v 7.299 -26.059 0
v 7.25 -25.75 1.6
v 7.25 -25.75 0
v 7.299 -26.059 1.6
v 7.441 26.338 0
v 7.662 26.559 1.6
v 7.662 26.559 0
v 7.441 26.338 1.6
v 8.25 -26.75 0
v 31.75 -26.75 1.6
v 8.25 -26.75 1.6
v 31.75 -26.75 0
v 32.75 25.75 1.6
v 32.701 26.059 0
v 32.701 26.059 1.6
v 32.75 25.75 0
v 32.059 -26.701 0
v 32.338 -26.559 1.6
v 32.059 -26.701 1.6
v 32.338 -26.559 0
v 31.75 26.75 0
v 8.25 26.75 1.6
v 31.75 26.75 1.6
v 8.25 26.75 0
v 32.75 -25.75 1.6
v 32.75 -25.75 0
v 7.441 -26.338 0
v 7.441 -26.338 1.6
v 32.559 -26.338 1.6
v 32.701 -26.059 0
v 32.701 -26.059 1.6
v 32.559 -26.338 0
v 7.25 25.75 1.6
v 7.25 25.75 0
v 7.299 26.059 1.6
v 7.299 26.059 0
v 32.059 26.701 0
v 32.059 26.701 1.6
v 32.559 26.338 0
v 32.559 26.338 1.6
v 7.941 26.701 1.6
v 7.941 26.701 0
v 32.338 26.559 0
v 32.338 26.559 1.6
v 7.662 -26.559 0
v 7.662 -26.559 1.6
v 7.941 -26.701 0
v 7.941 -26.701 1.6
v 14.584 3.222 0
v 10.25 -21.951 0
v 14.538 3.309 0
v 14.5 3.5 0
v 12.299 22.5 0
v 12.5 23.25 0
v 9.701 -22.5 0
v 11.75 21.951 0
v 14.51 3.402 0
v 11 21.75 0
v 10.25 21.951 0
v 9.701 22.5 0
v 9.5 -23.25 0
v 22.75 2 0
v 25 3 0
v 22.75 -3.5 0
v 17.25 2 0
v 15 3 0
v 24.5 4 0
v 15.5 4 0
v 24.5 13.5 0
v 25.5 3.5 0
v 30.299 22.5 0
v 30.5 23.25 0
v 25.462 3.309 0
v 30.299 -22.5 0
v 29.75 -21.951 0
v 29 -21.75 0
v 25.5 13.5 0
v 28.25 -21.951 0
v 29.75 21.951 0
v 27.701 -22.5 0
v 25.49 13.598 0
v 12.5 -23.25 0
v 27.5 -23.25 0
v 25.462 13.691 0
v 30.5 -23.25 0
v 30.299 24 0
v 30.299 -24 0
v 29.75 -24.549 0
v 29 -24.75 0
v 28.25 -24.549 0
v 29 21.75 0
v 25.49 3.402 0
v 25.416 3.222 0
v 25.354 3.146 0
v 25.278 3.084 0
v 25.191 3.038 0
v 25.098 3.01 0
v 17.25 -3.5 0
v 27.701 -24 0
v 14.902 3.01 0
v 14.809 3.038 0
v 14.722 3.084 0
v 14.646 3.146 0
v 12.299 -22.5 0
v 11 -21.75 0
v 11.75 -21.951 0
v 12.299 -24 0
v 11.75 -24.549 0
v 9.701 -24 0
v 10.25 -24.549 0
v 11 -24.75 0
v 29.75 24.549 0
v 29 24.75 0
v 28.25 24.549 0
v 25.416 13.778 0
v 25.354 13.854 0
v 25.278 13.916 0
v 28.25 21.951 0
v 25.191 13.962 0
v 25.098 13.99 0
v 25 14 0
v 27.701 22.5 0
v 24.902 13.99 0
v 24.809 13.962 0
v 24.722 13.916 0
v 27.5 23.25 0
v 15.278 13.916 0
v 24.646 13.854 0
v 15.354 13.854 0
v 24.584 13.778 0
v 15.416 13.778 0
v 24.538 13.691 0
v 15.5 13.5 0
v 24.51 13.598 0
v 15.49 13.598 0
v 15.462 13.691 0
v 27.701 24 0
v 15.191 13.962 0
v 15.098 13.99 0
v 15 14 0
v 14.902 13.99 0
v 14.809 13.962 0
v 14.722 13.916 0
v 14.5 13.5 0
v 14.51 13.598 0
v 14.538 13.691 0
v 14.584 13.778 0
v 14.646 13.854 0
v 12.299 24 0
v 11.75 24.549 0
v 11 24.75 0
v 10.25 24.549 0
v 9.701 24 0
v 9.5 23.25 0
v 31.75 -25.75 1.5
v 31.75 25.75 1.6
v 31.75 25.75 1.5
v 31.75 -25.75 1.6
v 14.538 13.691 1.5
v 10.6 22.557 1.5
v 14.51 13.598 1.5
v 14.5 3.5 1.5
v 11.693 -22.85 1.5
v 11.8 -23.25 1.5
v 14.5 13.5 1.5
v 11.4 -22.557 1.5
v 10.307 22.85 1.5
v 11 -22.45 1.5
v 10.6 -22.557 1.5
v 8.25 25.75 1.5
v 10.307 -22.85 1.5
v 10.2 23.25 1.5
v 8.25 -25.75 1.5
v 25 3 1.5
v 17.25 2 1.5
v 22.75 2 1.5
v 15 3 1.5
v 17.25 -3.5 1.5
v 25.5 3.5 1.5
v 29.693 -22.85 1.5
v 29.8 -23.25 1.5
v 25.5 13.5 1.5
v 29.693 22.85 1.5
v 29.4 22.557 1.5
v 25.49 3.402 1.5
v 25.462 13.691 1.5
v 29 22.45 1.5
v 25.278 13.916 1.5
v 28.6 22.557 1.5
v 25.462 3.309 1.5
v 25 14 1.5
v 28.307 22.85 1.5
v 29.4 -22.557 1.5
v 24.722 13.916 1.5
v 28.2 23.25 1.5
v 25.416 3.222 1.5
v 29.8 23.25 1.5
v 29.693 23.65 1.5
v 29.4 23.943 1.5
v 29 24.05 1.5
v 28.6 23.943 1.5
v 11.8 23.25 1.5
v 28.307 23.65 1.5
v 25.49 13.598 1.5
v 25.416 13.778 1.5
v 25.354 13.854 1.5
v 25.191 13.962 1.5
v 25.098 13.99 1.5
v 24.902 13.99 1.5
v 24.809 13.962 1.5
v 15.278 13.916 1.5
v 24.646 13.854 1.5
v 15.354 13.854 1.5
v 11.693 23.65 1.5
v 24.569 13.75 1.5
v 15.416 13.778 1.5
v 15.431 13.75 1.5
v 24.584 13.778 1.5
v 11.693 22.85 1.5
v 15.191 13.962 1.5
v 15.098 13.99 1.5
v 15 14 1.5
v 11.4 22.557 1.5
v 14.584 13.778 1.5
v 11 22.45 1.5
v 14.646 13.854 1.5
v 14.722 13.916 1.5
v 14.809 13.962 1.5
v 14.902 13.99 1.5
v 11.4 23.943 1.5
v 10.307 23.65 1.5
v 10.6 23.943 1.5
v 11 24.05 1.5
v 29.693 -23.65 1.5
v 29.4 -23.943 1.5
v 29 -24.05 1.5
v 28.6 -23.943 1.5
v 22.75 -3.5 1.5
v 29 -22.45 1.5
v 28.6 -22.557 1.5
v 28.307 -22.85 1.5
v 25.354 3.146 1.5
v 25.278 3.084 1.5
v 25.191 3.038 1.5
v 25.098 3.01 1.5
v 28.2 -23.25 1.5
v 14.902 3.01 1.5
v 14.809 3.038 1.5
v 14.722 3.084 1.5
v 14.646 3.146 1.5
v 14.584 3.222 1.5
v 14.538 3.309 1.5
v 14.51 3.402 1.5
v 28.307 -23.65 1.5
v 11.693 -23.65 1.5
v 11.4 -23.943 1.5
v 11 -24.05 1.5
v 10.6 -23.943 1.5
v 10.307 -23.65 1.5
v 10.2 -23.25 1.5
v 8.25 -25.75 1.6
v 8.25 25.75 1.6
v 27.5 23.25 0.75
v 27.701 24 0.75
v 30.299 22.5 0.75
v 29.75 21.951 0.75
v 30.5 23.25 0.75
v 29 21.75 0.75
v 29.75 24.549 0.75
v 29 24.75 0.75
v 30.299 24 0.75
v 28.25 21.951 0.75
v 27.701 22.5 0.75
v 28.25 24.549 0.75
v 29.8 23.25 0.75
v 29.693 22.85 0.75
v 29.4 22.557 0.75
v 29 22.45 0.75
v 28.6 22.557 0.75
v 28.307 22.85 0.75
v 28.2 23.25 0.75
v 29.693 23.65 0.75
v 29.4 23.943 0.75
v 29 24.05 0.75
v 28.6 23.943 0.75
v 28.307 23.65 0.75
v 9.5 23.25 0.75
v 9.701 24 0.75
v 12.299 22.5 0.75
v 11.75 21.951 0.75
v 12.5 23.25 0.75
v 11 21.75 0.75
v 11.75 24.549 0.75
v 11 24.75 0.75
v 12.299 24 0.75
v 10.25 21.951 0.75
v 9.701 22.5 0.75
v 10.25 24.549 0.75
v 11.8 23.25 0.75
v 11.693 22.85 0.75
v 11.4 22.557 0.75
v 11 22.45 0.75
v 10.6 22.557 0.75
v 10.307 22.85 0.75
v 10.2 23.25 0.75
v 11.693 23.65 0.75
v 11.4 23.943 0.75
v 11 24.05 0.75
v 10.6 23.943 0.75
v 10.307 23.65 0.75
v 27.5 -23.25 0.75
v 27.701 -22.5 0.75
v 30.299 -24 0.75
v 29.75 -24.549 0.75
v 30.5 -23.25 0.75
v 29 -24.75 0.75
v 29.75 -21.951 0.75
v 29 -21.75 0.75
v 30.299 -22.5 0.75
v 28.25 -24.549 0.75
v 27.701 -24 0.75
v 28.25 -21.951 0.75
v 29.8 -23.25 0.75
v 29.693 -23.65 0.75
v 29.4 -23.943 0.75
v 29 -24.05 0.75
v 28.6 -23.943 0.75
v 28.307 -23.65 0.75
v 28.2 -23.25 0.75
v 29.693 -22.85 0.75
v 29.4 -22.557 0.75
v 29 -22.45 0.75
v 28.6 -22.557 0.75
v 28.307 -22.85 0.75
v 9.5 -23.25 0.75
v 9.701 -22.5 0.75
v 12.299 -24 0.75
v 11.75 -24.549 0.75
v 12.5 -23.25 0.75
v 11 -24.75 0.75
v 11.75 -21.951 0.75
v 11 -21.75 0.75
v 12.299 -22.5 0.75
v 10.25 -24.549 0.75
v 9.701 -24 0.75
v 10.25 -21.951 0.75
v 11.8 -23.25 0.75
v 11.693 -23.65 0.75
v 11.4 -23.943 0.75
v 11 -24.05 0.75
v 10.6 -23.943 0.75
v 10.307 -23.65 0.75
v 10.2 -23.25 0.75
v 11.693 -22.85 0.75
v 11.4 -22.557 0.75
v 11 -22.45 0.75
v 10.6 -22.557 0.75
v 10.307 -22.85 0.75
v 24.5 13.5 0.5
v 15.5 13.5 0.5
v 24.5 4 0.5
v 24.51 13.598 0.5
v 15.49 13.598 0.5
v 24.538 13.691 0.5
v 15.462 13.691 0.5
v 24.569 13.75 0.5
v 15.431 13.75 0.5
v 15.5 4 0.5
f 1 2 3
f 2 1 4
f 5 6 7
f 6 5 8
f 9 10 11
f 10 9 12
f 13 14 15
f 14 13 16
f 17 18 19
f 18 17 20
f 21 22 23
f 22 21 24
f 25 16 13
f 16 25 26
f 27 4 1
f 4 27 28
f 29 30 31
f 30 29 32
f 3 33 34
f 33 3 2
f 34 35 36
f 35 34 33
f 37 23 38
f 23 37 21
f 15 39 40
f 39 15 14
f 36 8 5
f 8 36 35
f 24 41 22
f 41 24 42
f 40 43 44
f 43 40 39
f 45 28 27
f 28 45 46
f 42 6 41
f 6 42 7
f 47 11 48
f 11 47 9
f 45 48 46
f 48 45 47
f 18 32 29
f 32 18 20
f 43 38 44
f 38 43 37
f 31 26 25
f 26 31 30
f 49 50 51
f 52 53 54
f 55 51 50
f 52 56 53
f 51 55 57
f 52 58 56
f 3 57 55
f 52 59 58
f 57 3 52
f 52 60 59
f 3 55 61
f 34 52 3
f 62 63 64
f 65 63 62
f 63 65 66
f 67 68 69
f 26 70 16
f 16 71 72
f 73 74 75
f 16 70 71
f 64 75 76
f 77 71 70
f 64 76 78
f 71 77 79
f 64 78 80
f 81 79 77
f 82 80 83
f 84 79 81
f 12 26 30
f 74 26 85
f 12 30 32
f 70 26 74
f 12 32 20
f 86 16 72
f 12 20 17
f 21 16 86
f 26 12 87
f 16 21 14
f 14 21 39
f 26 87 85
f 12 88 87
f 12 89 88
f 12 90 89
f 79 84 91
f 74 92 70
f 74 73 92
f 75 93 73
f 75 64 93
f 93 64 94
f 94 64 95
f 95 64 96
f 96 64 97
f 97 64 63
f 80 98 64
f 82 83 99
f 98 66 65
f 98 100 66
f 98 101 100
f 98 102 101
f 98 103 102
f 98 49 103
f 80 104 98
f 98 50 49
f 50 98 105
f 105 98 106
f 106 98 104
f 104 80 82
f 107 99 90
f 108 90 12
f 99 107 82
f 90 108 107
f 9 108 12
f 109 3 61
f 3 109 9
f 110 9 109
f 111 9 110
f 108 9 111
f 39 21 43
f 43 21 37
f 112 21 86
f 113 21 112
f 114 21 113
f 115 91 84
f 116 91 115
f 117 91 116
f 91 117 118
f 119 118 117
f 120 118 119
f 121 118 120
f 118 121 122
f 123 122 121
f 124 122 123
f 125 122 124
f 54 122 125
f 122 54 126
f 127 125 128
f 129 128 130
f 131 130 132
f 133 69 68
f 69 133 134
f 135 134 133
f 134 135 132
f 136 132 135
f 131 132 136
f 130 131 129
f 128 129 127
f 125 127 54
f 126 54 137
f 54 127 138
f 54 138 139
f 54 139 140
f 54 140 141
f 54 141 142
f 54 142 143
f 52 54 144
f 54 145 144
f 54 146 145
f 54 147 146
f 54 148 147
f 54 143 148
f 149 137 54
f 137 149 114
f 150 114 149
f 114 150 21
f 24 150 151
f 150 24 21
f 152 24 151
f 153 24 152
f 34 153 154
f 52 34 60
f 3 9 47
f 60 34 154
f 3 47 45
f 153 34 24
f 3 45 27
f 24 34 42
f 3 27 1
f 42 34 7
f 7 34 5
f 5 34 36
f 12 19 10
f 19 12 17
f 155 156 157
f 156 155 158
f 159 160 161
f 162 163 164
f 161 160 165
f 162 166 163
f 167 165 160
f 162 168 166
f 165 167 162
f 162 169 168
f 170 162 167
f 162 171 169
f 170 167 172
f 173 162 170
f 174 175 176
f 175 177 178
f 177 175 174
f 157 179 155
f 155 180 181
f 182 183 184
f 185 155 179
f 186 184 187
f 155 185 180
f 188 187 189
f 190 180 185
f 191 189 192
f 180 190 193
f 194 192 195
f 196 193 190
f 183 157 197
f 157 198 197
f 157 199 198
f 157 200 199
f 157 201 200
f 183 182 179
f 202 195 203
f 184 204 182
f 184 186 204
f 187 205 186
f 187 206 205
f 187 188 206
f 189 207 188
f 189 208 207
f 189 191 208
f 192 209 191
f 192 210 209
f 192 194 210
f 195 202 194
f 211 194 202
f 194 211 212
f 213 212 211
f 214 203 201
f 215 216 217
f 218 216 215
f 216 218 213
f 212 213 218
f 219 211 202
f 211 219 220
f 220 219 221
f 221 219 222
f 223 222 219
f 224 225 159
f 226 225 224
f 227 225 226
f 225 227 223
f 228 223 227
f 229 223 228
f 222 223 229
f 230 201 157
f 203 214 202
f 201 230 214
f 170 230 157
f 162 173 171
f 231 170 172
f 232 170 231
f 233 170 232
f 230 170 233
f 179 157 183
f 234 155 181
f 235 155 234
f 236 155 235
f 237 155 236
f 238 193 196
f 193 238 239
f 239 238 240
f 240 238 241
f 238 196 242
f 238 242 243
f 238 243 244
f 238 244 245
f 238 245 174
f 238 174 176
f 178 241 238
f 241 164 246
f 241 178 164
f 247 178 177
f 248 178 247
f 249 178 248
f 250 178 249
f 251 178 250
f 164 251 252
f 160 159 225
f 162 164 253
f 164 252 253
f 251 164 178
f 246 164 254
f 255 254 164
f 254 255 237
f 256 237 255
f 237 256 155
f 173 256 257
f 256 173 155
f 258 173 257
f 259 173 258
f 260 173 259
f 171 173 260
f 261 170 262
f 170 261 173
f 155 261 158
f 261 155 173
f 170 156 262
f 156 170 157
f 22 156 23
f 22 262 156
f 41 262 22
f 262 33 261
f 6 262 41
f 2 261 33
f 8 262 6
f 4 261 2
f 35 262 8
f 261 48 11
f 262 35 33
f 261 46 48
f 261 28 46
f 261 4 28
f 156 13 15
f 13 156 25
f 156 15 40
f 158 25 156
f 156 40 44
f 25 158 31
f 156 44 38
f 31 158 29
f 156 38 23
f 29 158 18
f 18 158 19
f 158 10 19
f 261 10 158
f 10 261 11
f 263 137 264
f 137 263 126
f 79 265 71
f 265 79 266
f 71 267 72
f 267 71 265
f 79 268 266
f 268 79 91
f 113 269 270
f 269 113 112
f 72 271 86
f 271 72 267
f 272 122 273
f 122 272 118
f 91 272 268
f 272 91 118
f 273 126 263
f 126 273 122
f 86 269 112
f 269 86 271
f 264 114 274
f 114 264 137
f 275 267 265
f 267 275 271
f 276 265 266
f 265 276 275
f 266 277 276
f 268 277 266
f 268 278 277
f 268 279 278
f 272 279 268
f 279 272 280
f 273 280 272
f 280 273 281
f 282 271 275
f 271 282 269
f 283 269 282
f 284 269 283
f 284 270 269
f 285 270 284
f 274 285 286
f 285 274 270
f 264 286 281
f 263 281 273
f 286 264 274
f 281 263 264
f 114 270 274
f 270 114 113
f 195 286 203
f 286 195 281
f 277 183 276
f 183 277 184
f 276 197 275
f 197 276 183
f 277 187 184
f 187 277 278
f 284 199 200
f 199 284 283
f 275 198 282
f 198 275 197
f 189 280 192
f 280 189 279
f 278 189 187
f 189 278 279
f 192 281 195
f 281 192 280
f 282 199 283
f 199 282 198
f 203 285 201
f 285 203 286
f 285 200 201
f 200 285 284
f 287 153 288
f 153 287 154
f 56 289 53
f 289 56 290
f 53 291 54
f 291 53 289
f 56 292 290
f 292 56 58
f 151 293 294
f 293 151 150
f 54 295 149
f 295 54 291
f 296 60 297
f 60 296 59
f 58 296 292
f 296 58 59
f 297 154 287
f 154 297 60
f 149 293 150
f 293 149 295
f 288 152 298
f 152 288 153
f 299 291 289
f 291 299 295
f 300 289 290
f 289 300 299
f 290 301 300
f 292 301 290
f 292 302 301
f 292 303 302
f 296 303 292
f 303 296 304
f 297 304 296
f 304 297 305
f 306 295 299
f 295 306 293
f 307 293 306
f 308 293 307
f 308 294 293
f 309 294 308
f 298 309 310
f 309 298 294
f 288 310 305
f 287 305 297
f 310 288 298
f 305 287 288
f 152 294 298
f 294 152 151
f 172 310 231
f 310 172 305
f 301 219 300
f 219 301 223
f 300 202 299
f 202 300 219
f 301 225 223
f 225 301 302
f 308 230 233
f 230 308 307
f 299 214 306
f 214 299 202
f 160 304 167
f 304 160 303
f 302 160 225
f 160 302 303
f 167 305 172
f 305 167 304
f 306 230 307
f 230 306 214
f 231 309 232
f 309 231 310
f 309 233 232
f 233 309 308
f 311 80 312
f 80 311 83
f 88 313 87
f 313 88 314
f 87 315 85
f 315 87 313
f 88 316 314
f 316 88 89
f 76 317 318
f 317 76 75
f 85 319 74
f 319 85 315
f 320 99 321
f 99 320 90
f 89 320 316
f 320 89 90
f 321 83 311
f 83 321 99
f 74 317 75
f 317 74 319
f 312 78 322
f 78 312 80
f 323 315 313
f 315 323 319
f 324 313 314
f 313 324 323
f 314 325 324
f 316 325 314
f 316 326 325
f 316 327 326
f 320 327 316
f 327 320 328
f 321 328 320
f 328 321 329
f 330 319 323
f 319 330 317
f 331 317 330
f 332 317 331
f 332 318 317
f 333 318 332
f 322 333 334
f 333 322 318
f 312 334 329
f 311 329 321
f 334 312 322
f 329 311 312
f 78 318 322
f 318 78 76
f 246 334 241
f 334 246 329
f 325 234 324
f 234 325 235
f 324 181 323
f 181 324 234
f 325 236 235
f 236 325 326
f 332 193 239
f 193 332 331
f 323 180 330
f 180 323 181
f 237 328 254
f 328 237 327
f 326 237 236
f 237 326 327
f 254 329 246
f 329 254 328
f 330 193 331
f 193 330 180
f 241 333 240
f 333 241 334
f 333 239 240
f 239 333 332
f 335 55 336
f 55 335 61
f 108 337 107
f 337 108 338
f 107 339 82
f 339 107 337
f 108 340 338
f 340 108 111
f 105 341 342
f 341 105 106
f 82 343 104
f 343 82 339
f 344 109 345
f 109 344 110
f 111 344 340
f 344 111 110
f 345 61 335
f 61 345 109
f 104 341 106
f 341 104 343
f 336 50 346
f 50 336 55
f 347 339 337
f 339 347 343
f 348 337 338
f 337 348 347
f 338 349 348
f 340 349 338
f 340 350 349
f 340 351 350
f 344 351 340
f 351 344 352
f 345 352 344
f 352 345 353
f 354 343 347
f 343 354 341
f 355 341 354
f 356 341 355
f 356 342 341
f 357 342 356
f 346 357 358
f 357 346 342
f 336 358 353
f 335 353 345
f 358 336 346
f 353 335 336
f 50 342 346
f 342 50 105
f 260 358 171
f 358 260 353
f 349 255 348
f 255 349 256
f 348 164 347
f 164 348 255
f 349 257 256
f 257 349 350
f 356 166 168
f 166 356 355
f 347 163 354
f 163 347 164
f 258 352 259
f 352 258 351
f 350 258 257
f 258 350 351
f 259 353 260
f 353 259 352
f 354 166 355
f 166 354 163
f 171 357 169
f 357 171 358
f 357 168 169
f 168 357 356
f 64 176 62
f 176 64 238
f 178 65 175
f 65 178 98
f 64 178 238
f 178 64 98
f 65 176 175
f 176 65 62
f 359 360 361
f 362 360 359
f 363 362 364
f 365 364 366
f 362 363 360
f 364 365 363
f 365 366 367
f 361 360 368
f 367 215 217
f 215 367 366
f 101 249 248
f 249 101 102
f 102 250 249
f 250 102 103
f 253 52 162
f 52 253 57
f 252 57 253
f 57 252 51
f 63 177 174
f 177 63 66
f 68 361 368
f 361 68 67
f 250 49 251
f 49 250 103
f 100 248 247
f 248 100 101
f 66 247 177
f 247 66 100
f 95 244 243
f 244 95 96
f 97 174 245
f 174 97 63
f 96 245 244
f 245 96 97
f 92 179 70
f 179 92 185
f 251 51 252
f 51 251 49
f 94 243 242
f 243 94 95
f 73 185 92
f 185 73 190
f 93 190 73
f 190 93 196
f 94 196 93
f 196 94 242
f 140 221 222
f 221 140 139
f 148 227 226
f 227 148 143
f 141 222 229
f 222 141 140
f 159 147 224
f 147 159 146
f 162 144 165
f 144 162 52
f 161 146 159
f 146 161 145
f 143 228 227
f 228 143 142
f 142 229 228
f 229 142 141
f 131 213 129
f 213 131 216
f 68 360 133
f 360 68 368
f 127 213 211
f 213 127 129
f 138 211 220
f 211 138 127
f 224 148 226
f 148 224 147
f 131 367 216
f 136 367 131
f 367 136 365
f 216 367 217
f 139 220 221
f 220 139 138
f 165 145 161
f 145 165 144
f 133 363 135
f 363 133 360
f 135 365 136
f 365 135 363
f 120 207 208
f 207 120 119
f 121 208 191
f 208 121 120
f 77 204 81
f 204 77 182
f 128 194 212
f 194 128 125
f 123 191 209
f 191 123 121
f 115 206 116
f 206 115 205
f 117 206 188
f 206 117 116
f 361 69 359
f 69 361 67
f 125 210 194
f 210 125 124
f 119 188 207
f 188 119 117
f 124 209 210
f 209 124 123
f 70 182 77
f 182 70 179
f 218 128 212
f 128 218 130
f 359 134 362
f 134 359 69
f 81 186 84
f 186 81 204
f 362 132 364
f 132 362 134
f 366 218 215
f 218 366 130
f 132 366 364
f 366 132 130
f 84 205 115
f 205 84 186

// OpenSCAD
// 23.5 x 51.5r x 12

module bottom() union() {
    difference() {
        union() {
            minkowski() {
                cube([23.5, 51.5, 14], center=true);
                cylinder(d=2, h=2,  center=true, $fn=20);
            }        
        }
        
        cube([23.5, 51.5, 14], center=true);
        translate([0,0,9.4]) cube([26, 55, 6], center=true);
        
        translate([7.5,-23,-5]) cube([2, 15, 11], center=true);
        translate([3.75,-23,-5]) cube([2, 15, 11], center=true);
        translate([0,-23,-5]) cube([2, 15, 11], center=true);
        translate([-3.75,-23,-5]) cube([2, 15, 11], center=true);
        translate([-7.5,-23,-5]) cube([2, 15, 11], center=true);
        
        translate([-12,15.25,4.91]) cube([5,10,4], center=true);
    }

    translate([9,-23.25,2.5]) difference() {
        translate([1,-1,0]) cube([4.5, 4.5, 3], center=true);
        cylinder(r=0.5, h=20, center=true, $fn=12);
    }        

    translate([-9,-23.25,2.5]) difference() {
        translate([-1,-1,0]) cube([4.5, 4.5, 3], center=true);
        cylinder(r=0.5, h=20, center=true, $fn=12);
    }    

    translate([0,24,-3.5]) difference() {
        cube([25, 3.5, 7], center=true);
        translate([0,,-2]) rotate(45, [1,0,0]) cube([25, 7, 9], center=true);
    }    

    translate([0,23.25,5]) difference() {
        cube([25, 5, 2.8], center=true);
        translate([9,0,0]) cylinder(r=0.5, h=20, center=true, $fn=12);
        translate([-9,0,0]) cylinder(r=0.5, h=20, center=true, $fn=12);
        cube([16, 6, 3], center=true);
    }   
   
    translate([0,32,-3]) {
        difference() {
            hull() {
                rotate(90, [0,1,0]) cylinder(r=5, h=5, center=true, $fn=64);
                translate([0,-3,0]) cube([5,5,10], center=true);
            }
            
            rotate(90, [0,1,0]) cylinder(r=3, h=7, center=true, $fn=64);
        }
    }    
}

 module hole() {
     translate([0, 0, 7.75]) cylinder(r=1.5, h=1, center=true, $fn=12);
     translate([0, 0, 6.95]) cylinder(r=0.8, h=5, center=true, $fn=12);
 }

 //translate([40,-26.75,0]) cube([10,21,15]);
//translate([40,0,0]) translate([0,-26.75,0]) cube([10,27.5,15]);
// translate([40,0,0]) translate([0,0.75,0]) cube([5,5,15], center=true);

module corner() cylinder(d=1, h=5, center=true, $fn=32);

module top() difference() {
    intersection() {
        
        difference() {
            minkowski() {
                cube([23.5, 51.5, 14], center=true);
                cylinder(d=2, h=2,  center=true, $fn=20);
            }        
            cube([23.5, 51.5, 13], center=true);
        }
        translate([0,0,7.4]) cube([26, 55, 2], center=true);
    }
    
    translate([9,-23.25,0]) hole();
    translate([-9,-23.25,0]) hole();
    
    translate([0,23.25,0]) {
        translate([9,0,0]) hole();
        translate([-9,0,0]) hole();
    }

    translate([0,0.75,0]) cube([5.5,5.5,18], center=true);
    
    translate([0, -8.75, 0]) cube([10,10,15], center=true);
    
    translate([0, -3.5, 6.95]) hull() {
        translate([-5,0,0]) corner();
        translate([5,0,0]) corner();
    };

    translate([0, -3.5, 6.95]) hull() {
        translate([-5,0,0]) corner();
        translate([-5,-10,0]) corner();
    };
    
    translate([0, -3.5, 6.95]) hull() {
        translate([5,0,0]) corner();
        translate([5,-10,0]) corner();
    };
}

// bottom();
rotate(180, [1,0,0]) translate([20,0,-8]) top();
